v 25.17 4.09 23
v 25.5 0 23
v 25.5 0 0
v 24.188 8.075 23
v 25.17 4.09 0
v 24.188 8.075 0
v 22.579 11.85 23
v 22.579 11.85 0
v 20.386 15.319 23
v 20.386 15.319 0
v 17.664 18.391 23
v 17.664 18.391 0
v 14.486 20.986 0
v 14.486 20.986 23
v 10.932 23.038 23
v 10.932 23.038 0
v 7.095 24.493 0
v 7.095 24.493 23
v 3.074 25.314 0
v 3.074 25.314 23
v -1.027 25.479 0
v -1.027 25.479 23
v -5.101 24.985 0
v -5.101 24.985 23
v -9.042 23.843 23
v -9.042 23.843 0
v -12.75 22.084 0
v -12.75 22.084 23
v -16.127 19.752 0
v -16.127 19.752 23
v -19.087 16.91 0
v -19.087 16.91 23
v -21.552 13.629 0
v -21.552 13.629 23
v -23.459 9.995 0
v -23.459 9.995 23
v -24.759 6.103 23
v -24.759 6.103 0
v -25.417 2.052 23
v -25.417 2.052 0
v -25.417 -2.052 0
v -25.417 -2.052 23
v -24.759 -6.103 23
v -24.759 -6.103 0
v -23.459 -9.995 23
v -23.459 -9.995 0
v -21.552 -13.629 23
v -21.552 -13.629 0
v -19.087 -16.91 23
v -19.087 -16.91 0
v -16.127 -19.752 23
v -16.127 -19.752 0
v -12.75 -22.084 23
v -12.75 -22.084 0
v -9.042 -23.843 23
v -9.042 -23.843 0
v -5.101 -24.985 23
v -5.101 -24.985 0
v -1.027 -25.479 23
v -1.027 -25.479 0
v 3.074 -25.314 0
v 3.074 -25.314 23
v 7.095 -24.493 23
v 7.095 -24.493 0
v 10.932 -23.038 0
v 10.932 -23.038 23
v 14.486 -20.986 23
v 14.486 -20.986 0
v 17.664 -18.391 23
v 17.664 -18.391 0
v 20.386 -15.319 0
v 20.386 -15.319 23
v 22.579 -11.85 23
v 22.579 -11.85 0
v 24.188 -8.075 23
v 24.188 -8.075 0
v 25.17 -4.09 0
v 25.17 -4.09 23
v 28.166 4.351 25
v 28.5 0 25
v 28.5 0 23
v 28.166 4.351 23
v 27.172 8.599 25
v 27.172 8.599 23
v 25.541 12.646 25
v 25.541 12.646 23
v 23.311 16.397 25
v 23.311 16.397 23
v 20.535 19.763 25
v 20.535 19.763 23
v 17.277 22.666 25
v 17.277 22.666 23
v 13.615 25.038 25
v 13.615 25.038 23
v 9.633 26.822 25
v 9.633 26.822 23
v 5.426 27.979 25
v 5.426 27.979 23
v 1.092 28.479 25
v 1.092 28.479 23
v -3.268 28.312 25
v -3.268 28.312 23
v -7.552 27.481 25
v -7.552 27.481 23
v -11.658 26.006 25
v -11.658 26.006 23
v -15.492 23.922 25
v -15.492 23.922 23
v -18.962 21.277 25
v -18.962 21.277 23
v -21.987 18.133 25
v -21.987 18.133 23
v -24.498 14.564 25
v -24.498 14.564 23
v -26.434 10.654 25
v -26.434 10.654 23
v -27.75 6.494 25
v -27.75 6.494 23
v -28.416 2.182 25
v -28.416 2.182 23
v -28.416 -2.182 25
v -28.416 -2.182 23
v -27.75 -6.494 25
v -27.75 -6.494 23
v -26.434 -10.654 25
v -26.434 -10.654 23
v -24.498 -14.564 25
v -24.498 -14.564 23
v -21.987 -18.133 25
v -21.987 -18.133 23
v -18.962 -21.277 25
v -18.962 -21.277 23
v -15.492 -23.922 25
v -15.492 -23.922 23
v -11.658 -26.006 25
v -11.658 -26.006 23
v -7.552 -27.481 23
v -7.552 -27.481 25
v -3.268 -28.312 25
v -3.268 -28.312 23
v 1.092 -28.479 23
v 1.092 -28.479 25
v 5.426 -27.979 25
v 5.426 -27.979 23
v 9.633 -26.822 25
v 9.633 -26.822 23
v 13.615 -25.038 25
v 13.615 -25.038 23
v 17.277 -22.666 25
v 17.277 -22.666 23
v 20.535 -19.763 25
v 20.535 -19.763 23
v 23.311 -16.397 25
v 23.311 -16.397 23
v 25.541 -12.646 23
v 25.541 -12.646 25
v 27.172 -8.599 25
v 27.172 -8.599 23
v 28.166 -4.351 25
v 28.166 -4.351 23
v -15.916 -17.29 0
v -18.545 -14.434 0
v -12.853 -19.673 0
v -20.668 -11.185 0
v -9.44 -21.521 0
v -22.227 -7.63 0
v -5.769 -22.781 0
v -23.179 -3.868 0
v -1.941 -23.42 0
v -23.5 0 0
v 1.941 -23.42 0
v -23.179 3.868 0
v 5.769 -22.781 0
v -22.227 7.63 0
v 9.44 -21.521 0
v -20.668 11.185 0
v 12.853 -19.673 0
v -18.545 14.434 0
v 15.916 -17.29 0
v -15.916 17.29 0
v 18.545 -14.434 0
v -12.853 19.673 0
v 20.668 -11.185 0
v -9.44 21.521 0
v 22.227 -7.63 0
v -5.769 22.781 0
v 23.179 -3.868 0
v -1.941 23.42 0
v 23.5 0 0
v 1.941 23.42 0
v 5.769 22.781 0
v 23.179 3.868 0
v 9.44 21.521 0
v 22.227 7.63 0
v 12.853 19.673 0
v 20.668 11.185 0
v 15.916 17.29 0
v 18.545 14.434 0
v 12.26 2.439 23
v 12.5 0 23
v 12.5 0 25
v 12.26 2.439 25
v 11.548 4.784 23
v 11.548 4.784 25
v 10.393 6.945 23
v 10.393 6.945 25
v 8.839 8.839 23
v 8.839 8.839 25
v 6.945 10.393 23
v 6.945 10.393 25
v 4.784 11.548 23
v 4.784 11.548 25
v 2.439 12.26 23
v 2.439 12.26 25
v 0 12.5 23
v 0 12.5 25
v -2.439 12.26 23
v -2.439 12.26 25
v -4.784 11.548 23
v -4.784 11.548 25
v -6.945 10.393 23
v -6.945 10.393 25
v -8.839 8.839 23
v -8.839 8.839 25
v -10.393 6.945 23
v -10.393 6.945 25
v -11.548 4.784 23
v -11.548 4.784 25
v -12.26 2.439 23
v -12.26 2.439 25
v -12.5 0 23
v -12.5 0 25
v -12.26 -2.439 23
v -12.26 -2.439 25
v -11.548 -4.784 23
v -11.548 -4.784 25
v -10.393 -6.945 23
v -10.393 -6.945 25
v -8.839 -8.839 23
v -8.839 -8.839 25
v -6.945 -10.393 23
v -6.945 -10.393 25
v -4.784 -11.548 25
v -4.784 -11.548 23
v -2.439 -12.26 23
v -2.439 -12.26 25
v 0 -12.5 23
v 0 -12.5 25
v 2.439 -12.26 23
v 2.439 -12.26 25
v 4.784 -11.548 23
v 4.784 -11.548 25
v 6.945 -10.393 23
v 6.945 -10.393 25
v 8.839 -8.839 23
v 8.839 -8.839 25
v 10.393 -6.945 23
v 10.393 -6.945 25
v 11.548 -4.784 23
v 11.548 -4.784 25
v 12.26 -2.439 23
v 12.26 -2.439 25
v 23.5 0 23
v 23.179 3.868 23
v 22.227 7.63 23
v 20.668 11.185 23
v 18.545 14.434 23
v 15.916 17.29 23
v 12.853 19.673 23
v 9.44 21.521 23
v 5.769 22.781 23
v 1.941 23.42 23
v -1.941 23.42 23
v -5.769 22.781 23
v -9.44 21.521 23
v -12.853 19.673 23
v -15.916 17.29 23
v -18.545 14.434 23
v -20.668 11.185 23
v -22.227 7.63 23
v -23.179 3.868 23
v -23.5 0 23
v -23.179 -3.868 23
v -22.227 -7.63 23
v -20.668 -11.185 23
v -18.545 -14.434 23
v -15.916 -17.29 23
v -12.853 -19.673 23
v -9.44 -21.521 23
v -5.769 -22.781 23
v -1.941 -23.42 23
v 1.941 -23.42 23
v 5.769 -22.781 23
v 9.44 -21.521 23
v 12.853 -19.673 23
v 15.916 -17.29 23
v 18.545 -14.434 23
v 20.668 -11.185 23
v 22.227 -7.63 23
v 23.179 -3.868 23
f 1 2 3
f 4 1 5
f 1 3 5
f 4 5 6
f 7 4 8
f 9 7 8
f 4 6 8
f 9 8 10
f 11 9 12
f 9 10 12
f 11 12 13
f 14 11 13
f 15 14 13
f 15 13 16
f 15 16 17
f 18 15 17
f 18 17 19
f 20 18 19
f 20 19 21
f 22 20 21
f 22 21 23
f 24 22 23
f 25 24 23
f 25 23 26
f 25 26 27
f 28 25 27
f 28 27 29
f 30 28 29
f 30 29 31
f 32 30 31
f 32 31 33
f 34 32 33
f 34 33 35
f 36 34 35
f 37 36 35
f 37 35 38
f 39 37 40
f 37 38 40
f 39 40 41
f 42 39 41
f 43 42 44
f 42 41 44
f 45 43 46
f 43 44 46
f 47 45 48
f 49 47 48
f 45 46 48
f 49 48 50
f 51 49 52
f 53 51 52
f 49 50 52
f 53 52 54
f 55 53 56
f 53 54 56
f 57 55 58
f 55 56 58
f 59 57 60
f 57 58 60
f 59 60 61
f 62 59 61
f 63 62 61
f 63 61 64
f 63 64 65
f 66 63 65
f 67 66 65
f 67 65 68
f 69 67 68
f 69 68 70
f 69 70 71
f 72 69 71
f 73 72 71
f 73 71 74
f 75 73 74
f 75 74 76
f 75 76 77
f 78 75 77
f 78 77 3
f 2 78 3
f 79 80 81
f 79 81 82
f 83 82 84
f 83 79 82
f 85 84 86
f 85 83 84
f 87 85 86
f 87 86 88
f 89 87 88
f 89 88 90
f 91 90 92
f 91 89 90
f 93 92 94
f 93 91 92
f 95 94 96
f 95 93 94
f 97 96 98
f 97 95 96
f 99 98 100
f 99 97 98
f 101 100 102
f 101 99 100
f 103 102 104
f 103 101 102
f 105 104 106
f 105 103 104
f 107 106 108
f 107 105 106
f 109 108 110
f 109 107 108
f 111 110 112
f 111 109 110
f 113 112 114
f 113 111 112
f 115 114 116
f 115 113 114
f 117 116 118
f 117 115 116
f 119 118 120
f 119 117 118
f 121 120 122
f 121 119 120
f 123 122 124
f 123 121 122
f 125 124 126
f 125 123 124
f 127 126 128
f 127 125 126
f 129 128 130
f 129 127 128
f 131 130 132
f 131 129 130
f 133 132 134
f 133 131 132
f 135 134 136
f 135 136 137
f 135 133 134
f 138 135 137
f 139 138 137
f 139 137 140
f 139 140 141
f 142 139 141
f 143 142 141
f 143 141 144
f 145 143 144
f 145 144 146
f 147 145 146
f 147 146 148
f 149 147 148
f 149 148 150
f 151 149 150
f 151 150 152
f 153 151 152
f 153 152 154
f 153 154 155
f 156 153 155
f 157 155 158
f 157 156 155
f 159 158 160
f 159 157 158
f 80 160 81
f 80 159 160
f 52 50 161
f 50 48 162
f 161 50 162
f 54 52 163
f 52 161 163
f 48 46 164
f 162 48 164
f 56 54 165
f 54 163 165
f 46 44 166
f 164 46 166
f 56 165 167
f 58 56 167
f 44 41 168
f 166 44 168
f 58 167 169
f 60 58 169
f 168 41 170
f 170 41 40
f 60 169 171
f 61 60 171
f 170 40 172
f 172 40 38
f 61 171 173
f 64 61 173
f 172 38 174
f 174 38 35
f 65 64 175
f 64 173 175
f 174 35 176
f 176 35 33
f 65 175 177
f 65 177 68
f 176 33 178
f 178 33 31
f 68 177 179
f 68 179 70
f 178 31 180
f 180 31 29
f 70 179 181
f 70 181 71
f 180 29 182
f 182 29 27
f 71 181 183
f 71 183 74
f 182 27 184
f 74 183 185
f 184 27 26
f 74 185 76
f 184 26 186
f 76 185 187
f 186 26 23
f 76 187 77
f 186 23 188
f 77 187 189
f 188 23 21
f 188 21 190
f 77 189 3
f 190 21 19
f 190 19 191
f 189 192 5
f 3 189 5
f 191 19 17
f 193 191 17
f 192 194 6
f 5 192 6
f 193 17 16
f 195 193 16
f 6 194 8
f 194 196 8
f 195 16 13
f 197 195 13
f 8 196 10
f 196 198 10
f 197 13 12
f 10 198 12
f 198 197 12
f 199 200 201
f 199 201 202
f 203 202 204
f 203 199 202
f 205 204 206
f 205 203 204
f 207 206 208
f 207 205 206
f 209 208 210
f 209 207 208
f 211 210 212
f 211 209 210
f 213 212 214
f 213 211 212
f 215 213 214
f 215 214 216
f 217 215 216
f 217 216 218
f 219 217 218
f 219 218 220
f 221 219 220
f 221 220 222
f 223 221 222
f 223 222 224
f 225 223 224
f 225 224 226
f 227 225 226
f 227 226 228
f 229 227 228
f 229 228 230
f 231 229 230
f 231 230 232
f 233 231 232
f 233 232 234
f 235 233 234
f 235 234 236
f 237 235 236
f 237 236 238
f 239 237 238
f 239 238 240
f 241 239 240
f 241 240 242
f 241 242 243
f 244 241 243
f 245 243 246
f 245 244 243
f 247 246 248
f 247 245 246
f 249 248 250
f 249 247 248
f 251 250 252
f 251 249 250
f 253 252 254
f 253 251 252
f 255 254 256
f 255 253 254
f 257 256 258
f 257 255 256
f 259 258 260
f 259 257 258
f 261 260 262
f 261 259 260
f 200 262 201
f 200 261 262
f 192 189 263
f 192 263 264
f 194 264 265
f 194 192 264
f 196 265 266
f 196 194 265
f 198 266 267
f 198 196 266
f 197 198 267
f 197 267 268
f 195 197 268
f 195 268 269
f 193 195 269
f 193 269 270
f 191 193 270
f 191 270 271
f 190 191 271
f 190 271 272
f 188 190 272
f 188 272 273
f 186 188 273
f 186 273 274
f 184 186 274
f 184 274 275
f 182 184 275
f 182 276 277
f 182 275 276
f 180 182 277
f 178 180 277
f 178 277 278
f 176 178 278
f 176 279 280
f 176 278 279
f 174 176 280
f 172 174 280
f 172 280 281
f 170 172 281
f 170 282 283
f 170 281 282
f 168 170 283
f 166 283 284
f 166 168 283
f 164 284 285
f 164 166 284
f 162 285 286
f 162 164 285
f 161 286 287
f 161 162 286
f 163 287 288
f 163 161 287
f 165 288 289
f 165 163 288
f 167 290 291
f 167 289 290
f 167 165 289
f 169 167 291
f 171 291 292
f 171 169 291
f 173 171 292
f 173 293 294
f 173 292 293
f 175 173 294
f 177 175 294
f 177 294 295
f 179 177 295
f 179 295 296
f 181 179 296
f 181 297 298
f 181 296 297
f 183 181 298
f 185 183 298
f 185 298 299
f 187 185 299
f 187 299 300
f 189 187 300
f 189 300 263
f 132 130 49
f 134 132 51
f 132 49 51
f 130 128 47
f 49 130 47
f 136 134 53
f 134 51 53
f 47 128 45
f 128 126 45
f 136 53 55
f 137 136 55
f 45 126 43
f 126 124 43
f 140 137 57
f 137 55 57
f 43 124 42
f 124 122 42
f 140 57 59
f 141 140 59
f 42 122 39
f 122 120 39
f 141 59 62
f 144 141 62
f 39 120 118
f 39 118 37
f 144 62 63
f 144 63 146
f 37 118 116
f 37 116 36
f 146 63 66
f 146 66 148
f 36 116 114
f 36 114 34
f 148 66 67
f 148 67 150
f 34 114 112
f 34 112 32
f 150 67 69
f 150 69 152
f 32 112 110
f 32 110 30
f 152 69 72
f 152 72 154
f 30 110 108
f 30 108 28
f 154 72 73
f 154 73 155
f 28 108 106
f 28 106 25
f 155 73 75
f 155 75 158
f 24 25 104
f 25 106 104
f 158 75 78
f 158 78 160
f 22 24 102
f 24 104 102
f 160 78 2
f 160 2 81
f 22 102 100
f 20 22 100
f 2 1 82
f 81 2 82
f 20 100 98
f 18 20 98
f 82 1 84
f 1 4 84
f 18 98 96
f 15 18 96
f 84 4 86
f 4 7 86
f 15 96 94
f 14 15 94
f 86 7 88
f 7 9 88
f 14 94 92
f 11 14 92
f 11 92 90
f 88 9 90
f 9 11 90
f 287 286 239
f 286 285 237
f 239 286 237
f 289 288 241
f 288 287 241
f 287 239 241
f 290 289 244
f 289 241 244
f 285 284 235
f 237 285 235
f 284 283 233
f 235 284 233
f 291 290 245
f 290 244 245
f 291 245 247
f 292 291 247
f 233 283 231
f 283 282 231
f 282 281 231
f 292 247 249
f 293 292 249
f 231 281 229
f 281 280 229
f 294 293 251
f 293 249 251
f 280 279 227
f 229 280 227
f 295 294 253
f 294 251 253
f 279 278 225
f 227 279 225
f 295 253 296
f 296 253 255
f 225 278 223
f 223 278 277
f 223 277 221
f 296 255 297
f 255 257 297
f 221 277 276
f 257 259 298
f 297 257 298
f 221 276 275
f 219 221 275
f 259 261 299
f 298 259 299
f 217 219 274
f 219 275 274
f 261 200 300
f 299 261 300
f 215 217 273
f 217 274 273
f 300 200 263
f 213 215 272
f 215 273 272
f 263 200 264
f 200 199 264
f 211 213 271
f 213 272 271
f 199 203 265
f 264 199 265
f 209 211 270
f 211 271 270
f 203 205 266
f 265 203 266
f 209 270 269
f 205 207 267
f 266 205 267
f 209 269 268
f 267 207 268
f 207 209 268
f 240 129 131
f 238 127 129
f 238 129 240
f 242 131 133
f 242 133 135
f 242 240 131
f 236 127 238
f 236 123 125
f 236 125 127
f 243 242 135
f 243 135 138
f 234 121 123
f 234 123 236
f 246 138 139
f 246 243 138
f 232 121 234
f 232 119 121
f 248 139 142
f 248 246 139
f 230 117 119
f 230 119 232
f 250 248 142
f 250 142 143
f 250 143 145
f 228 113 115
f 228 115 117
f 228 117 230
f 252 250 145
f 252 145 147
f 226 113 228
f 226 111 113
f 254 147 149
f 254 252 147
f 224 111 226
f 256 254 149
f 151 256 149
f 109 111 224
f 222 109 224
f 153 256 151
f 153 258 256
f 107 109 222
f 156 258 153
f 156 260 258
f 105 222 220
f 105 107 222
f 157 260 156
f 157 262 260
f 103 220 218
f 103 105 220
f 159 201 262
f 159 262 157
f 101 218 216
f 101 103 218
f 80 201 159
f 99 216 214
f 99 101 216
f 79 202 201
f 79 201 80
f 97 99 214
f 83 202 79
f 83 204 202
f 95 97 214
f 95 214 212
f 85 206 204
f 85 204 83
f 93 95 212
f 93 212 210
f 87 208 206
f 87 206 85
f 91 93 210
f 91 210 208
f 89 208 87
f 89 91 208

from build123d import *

# Parameters (mm, degrees)
F0_R     = 25.5
F0_R_2   = 12.5
F1_DEPTH = 25
F2_T     = -2
F3_DEPTH = 25
F4_R     = 28.5
F4_R_2   = 25.5
F5_DEPTH = 2


with BuildPart() as f1:
    # F0 (on Top) → F1 (new body)
    with BuildSketch(Plane.XY):
        Circle(F0_R)
        Circle(F0_R_2, mode=Mode.SUBTRACT)
        Circle(F0_R_2)
    extrude(amount=F1_DEPTH)

    # F2
    f2_openings = [f1.faces().sort_by_distance(p)[0] for p in [
        (0, 0, 0),
    ]]
    offset(amount=F2_T, openings=f2_openings)

    # F0 (on Top) → F3 (cut, through all)
    with BuildSketch(Plane.XY):
        Circle(F0_R_2)
    extrude(amount=F3_DEPTH, mode=Mode.SUBTRACT)

    # F4 (on face) → F5 (join)
    with BuildSketch(Plane.XY.offset(25)):
        Circle(F4_R)
        Circle(F4_R_2, mode=Mode.SUBTRACT)
    extrude(amount=-F5_DEPTH)


solid = f1.part
